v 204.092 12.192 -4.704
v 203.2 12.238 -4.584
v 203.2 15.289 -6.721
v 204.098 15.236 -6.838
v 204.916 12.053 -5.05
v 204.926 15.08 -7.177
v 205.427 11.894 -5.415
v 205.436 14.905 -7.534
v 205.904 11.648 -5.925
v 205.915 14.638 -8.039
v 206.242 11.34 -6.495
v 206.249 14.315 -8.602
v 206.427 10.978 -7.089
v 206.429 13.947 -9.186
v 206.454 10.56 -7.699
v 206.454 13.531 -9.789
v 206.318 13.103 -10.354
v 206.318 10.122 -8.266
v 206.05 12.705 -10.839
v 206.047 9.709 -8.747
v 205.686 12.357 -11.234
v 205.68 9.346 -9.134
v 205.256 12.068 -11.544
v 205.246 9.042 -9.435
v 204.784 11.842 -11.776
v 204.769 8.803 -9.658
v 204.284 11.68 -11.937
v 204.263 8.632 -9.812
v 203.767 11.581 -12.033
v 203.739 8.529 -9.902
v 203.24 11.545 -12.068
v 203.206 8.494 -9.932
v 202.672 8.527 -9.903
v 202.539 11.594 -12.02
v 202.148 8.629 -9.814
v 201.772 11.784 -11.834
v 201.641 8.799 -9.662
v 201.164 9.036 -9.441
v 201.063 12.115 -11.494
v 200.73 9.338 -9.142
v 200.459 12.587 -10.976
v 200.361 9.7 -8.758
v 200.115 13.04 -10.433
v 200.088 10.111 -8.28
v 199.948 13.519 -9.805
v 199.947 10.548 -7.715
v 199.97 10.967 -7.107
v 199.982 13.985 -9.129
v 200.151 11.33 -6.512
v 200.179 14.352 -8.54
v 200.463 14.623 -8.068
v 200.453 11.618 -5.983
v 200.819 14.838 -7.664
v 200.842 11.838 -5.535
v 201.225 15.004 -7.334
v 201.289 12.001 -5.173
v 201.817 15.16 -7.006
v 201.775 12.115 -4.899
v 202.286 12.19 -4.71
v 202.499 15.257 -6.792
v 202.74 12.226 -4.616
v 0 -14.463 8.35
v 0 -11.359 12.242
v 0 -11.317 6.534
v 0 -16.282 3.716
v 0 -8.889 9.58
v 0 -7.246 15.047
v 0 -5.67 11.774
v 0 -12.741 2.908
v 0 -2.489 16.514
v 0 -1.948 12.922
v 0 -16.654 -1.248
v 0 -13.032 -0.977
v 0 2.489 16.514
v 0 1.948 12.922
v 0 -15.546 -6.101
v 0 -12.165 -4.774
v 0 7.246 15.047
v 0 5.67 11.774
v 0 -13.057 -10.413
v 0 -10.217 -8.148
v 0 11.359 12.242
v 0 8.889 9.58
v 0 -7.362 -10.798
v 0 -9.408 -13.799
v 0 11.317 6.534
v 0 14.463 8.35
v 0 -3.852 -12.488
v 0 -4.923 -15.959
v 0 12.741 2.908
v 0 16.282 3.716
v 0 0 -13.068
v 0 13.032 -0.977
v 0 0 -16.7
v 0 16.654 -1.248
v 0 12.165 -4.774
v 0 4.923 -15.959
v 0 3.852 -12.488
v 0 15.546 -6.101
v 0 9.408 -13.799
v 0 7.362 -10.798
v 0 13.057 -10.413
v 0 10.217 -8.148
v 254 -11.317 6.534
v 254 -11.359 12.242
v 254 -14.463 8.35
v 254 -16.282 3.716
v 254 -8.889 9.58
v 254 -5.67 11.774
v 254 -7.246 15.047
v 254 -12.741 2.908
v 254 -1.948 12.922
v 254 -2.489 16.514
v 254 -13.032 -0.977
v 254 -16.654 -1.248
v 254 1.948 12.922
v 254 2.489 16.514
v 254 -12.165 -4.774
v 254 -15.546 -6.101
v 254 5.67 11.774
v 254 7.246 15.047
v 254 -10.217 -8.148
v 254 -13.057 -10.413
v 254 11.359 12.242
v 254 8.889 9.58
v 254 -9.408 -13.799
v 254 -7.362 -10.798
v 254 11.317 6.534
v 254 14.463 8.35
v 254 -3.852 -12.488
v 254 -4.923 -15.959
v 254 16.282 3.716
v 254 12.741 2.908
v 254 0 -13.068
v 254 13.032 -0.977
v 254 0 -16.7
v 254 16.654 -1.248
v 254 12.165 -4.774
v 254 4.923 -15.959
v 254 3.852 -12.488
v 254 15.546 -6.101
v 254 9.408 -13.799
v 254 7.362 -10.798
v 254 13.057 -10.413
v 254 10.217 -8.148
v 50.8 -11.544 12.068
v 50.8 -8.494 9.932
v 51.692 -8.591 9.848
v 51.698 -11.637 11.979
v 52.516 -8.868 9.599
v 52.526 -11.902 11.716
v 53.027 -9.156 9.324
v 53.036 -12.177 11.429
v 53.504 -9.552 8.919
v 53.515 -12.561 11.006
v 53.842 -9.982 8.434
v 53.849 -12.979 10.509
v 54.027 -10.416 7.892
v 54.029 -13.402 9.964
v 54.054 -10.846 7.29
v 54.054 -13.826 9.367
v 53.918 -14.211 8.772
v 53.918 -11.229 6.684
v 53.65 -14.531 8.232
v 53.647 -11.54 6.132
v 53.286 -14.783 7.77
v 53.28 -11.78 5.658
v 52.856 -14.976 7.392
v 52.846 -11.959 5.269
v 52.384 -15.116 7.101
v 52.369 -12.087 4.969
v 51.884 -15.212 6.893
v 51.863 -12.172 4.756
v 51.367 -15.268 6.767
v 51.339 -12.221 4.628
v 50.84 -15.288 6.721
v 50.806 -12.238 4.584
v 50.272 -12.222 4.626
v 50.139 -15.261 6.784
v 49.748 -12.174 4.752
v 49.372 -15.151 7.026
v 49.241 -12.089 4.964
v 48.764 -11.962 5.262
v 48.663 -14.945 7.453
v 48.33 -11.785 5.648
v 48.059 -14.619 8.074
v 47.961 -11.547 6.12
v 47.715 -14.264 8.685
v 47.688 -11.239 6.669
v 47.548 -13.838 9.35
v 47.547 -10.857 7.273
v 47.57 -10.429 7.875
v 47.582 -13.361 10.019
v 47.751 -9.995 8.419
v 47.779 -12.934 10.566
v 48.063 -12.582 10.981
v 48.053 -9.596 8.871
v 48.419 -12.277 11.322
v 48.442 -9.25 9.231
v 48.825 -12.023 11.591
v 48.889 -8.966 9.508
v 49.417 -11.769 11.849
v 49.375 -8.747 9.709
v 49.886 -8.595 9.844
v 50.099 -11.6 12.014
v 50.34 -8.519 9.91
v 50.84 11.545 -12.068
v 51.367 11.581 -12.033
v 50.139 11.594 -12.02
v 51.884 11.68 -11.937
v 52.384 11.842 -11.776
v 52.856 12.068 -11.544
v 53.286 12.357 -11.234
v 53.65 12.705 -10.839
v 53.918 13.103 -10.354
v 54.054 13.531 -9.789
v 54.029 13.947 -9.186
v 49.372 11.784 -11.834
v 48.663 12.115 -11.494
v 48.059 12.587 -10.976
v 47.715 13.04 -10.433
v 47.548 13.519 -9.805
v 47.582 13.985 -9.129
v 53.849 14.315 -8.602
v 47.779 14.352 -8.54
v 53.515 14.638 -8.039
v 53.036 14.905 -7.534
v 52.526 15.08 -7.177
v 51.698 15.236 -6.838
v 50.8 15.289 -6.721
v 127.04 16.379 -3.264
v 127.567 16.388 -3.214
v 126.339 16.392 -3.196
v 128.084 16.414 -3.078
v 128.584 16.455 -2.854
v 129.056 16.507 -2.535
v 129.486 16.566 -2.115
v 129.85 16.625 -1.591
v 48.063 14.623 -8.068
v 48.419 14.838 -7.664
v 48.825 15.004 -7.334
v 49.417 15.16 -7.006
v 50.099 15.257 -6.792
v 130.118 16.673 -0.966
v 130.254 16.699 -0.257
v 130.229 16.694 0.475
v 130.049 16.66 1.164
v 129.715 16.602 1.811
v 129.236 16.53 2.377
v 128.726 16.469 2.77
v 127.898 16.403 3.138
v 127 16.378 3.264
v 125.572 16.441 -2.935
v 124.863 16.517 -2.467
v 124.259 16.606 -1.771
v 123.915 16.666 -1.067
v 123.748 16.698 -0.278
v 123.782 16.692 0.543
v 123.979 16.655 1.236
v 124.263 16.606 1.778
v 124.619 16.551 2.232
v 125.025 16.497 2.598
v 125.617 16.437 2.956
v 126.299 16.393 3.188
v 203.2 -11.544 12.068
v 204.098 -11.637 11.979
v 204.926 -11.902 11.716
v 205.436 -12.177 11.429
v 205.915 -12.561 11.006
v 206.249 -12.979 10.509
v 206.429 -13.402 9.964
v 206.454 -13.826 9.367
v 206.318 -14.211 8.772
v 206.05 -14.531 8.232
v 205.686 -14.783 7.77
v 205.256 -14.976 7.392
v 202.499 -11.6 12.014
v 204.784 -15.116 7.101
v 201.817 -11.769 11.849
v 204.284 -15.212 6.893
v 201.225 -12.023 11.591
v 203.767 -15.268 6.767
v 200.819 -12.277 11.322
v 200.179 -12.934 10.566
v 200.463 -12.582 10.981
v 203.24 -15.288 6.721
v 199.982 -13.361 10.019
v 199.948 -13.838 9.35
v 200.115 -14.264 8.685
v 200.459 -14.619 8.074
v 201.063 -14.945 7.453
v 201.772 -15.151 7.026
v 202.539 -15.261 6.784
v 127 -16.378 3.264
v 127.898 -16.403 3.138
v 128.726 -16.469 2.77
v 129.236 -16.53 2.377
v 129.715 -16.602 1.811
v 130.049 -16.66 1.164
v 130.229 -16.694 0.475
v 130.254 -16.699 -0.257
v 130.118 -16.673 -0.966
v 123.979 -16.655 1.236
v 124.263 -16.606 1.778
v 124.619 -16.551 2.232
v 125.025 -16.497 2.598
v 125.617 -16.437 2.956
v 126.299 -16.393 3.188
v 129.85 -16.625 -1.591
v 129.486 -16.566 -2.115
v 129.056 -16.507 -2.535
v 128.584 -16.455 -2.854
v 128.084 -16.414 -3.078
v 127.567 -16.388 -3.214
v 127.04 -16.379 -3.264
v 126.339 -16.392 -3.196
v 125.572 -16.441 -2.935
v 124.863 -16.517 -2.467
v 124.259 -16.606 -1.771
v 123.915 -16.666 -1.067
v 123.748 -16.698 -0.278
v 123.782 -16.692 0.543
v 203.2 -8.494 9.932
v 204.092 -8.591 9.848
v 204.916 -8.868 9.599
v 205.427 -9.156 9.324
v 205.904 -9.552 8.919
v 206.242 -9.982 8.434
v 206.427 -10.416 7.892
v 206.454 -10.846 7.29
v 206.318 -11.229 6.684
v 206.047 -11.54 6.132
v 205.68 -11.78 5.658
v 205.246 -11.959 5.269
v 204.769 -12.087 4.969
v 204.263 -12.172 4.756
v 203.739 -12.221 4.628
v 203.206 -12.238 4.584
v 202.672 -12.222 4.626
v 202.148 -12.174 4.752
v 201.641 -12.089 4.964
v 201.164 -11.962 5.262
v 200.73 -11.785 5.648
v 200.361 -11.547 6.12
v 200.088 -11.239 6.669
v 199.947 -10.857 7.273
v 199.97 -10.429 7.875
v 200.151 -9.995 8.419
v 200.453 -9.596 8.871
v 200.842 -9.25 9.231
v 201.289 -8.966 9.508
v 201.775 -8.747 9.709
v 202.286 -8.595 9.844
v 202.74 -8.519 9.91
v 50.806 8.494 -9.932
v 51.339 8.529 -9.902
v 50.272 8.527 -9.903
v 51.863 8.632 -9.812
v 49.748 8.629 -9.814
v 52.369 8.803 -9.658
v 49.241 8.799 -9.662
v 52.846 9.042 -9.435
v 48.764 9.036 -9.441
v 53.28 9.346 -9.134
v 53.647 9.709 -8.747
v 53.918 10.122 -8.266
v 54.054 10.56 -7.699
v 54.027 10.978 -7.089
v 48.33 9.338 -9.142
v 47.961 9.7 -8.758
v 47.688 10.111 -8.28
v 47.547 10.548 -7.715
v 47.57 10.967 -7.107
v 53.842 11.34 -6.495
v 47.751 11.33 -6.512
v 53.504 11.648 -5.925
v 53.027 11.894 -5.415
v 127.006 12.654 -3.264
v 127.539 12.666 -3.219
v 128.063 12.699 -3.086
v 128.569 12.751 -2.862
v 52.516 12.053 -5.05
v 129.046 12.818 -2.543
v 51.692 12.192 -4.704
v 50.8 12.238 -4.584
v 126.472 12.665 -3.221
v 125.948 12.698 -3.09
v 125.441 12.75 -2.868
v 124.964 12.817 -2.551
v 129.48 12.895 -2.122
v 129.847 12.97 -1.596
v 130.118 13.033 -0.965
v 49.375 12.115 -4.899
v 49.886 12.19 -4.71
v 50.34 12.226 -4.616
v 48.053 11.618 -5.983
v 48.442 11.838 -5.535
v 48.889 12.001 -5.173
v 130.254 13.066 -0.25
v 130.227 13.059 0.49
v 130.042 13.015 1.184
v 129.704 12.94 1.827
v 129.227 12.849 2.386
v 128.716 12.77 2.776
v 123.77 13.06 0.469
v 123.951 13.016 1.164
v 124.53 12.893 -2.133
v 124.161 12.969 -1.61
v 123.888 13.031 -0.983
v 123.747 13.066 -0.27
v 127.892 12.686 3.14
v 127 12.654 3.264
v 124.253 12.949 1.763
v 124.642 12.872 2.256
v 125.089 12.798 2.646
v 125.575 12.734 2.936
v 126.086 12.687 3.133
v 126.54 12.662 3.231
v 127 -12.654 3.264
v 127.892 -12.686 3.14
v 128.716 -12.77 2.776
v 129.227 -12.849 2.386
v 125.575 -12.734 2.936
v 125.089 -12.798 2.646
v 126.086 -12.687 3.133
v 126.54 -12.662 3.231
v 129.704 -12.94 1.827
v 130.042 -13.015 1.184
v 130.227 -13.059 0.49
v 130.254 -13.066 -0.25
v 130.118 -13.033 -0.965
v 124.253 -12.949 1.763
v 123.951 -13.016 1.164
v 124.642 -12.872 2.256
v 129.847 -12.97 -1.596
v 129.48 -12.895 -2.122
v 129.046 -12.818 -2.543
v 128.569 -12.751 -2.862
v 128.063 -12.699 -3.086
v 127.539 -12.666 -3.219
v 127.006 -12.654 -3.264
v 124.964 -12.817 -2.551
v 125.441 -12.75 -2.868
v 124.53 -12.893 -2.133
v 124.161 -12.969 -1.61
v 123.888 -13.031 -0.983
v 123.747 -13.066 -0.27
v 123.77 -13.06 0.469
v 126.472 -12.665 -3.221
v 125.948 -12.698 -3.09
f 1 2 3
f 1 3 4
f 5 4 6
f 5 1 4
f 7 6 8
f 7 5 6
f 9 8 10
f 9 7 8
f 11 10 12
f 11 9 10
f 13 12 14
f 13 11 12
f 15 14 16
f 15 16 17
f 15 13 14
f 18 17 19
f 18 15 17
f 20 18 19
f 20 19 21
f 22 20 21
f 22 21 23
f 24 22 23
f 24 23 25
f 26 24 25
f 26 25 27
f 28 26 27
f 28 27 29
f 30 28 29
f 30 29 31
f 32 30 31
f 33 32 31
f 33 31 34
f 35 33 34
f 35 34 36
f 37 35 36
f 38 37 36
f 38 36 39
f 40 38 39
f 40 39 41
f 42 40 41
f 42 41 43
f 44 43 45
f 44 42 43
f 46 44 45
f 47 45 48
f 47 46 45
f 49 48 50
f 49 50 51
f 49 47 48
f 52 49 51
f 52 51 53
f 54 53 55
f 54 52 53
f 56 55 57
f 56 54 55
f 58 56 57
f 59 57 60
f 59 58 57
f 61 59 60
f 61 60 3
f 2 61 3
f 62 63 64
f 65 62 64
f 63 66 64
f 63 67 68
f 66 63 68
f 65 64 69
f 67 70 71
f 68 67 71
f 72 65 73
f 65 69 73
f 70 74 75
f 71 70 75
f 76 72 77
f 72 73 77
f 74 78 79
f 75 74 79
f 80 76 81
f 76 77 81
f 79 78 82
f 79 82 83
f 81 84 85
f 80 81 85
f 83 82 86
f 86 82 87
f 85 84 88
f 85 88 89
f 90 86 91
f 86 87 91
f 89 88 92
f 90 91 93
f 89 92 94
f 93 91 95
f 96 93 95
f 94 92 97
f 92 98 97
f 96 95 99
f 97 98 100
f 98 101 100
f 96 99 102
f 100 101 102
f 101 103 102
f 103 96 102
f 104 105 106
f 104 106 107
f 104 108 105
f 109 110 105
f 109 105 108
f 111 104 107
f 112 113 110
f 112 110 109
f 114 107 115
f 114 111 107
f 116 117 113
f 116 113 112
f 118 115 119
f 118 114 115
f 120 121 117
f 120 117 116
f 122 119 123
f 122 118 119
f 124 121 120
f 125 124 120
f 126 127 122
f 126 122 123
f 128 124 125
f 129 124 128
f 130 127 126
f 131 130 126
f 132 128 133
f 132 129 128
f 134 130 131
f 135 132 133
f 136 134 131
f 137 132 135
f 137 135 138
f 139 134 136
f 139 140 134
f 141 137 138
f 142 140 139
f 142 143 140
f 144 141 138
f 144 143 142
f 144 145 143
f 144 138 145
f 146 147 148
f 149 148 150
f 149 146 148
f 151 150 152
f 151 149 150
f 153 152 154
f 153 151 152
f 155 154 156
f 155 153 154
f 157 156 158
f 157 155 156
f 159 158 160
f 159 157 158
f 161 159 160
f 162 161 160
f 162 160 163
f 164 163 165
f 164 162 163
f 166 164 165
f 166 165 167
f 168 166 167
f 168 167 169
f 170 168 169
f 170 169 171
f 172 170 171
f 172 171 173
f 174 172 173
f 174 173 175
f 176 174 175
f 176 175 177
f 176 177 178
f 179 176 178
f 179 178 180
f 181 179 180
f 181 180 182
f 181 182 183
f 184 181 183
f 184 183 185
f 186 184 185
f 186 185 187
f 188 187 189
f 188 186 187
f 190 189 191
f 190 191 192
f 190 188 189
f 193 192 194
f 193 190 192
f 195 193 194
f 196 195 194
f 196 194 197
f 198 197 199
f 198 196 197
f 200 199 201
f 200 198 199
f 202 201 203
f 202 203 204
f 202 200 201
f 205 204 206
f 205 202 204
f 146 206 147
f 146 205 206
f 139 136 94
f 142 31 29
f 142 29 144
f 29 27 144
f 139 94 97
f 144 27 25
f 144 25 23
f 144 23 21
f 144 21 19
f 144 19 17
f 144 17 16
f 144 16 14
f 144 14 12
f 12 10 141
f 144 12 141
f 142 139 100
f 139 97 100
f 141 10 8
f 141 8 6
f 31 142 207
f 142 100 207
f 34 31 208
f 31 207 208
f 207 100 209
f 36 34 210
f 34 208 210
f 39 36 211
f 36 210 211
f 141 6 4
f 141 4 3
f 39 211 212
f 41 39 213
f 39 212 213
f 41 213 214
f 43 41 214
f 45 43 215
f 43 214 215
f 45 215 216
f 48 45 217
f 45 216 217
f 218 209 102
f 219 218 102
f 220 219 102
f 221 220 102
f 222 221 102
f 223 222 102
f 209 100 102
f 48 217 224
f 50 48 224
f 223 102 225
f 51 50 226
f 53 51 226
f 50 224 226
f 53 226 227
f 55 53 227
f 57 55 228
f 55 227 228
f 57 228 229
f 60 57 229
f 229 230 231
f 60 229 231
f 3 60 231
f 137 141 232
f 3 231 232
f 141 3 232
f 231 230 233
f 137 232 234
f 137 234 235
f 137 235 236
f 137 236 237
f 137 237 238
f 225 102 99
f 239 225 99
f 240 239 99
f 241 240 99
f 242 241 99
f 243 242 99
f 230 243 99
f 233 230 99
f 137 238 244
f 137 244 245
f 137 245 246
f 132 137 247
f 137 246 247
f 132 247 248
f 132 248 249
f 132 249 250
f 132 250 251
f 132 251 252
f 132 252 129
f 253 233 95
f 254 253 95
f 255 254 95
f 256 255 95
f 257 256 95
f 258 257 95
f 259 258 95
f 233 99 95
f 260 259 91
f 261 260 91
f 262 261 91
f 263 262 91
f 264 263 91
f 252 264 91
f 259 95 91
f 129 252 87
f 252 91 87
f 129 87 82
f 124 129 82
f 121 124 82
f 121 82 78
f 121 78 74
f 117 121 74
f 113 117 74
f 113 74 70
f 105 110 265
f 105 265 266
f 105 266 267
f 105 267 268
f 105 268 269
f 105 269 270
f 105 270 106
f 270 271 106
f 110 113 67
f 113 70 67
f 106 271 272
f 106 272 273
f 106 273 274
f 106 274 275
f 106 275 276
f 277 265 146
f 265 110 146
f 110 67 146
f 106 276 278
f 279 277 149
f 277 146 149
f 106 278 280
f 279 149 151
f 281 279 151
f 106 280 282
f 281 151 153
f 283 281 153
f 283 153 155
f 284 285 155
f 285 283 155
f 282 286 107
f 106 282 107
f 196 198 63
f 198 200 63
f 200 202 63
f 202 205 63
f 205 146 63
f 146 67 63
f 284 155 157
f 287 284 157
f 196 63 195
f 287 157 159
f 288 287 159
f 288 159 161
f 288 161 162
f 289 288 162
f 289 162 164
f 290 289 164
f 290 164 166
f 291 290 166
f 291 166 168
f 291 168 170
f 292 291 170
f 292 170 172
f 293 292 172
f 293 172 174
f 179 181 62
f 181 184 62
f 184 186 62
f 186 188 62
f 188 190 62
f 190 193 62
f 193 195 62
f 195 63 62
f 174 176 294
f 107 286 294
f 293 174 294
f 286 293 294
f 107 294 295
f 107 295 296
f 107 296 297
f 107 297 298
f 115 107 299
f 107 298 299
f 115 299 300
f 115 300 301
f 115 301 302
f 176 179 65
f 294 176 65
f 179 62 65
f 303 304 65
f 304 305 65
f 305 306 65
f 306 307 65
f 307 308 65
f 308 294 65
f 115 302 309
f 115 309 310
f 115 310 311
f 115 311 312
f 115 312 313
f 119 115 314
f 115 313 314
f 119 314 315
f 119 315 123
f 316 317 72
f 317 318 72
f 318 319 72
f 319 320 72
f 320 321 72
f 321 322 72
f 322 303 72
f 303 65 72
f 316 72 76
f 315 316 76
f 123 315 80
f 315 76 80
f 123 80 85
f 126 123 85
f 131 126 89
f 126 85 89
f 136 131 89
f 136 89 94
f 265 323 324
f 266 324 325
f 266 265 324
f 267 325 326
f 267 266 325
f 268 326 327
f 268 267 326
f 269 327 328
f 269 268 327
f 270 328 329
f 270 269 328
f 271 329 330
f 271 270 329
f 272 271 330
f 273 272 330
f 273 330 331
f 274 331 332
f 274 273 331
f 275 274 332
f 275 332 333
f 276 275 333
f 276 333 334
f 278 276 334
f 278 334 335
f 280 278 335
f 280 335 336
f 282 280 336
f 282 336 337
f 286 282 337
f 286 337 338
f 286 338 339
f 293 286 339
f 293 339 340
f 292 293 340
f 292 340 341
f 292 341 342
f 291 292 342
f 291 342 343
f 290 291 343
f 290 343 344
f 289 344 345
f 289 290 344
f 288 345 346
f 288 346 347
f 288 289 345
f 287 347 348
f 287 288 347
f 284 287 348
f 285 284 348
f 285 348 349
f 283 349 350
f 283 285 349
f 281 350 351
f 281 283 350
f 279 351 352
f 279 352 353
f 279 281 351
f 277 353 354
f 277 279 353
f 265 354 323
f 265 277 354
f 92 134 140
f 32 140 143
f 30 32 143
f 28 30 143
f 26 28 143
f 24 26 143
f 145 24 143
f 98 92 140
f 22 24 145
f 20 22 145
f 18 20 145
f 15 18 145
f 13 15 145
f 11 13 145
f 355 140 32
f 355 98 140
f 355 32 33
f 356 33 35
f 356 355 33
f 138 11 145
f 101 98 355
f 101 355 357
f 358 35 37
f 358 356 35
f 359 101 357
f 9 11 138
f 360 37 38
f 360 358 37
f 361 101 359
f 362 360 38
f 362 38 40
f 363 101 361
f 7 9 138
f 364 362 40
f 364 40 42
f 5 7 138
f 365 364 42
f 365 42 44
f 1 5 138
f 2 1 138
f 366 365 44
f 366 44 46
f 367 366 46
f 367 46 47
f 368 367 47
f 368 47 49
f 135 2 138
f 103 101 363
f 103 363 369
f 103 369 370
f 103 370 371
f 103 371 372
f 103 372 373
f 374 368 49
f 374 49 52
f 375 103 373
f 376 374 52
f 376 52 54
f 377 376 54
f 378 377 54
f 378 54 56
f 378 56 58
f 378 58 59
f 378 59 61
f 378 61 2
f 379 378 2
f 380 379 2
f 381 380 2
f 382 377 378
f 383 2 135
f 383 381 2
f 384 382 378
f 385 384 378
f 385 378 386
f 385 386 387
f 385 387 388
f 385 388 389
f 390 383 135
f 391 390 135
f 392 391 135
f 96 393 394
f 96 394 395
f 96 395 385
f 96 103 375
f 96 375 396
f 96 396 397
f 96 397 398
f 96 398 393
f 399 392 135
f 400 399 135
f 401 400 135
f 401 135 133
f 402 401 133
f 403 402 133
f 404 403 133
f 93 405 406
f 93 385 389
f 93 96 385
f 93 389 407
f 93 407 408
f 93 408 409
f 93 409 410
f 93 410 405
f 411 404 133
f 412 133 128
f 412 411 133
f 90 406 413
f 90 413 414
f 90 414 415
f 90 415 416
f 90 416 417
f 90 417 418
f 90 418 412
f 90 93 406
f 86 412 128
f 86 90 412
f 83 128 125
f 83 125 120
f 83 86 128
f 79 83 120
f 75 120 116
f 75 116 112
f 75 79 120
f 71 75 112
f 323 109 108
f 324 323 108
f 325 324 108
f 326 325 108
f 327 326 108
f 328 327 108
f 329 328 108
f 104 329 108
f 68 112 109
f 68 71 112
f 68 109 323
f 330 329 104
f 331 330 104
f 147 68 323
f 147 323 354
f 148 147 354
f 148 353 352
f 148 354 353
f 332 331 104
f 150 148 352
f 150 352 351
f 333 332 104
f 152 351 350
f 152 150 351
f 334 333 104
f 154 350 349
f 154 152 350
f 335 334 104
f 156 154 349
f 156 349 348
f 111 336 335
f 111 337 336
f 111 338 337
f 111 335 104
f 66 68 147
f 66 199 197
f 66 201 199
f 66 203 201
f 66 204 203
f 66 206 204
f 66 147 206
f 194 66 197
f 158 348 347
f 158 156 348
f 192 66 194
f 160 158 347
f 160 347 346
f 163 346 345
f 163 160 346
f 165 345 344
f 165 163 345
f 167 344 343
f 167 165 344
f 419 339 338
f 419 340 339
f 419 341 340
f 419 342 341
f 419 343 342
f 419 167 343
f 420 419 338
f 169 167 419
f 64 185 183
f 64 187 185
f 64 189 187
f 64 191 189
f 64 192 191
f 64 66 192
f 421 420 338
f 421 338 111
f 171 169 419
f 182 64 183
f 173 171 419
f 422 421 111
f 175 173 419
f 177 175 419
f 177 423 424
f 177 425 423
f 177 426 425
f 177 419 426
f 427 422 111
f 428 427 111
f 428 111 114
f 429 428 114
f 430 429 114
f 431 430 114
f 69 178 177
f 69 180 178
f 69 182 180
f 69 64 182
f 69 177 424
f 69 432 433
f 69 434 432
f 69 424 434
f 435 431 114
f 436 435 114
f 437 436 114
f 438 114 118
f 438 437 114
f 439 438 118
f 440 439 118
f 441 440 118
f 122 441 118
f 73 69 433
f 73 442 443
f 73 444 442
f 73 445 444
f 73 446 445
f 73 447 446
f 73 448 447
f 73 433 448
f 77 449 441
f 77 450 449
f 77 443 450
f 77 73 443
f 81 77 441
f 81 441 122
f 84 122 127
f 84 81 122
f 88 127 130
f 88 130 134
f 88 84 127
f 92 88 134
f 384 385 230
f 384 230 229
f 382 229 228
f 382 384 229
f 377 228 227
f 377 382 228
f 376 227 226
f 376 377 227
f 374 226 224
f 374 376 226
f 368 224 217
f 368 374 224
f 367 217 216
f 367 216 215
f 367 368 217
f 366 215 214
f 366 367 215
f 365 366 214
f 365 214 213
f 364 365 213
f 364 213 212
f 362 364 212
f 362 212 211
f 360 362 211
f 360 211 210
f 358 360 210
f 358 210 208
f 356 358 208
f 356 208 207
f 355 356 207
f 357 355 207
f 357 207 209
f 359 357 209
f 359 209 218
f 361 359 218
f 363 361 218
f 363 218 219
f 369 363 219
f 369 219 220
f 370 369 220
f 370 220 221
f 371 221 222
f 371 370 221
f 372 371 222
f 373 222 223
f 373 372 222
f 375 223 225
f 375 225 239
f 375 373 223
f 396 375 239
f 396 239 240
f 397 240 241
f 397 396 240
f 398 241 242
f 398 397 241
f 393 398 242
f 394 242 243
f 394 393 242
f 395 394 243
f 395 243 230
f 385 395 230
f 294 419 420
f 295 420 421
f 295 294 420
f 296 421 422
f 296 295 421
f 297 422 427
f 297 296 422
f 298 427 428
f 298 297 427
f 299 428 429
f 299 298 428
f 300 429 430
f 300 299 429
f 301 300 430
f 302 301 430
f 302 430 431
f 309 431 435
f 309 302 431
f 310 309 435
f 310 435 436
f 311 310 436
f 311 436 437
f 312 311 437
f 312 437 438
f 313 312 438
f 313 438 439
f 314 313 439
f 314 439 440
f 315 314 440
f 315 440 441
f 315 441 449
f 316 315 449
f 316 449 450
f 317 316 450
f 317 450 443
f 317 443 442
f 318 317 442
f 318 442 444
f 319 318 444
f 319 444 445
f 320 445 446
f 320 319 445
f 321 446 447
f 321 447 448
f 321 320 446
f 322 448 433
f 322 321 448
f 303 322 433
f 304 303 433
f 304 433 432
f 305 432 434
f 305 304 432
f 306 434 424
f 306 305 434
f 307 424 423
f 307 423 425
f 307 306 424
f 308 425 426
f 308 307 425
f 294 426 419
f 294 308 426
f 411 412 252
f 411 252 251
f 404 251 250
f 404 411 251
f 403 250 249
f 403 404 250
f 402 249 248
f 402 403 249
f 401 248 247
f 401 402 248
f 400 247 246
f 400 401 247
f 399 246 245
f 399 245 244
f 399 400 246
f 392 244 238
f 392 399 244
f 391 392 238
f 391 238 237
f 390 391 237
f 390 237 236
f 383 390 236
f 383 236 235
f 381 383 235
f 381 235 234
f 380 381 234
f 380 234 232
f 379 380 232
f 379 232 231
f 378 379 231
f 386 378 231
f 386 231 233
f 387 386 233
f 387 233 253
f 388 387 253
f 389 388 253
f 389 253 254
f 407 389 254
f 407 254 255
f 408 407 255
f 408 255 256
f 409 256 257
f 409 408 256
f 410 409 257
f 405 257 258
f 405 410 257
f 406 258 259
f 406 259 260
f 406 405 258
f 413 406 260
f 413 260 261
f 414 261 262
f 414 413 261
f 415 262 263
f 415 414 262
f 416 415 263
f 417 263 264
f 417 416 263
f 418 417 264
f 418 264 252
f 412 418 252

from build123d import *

# Parameters (mm, degrees)
SKETCH1_R               = 16.7005
SKETCH1_R_2             = 13.0683
BOSS_EXTRUDE1_DEPTH     = 254
CUT_EXTRUDE2_DEPTH      = 256.095694594
CUT_EXTRUDE2_DEPTH_BACK = 256.095694594
SKETCH3_R               = 3.2639
CUT_EXTRUDE3_DEPTH      = 256.095694707
CUT_EXTRUDE3_DEPTH_BACK = 256.095694707
SKETCH4_R               = 3.2639


with BuildPart() as part:
    # Sketch1 → Boss-Extrude1 (new body)
    with BuildSketch(Plane(origin=(0, 0, 0), x_dir=(0, 0, -1), z_dir=(1, 0, 0))):
        Circle(SKETCH1_R)
        Circle(SKETCH1_R_2, mode=Mode.SUBTRACT)
    extrude(amount=BOSS_EXTRUDE1_DEPTH)

    # Sketch3 → Cut-Extrude2 (cut, two sides: drawn at the far end of the back side and taken through both)
    with BuildSketch(Plane(origin=(0, 0, 0), x_dir=(1, 0, 0), z_dir=(0, 1, 0)).offset(-CUT_EXTRUDE2_DEPTH_BACK)):
        with Locations((127, 0)):
            Circle(SKETCH3_R)
    extrude(amount=CUT_EXTRUDE2_DEPTH + CUT_EXTRUDE2_DEPTH_BACK, mode=Mode.SUBTRACT)

    # Sketch4 → Cut-Extrude3 (cut, two sides: drawn at the far end of the back side and taken through both)
    with BuildSketch(Plane(origin=(0, 0, 0), x_dir=(-1, 0, 0), z_dir=(0, 0.819152044288991, -0.5735764363510473)).offset(-CUT_EXTRUDE3_DEPTH_BACK)):
        with Locations((-203.2, 0)):
            Circle(SKETCH4_R)
        with Locations((-50.8, 0)):
            Circle(SKETCH4_R)
    extrude(amount=CUT_EXTRUDE3_DEPTH + CUT_EXTRUDE3_DEPTH_BACK, mode=Mode.SUBTRACT)


solid = part.part
